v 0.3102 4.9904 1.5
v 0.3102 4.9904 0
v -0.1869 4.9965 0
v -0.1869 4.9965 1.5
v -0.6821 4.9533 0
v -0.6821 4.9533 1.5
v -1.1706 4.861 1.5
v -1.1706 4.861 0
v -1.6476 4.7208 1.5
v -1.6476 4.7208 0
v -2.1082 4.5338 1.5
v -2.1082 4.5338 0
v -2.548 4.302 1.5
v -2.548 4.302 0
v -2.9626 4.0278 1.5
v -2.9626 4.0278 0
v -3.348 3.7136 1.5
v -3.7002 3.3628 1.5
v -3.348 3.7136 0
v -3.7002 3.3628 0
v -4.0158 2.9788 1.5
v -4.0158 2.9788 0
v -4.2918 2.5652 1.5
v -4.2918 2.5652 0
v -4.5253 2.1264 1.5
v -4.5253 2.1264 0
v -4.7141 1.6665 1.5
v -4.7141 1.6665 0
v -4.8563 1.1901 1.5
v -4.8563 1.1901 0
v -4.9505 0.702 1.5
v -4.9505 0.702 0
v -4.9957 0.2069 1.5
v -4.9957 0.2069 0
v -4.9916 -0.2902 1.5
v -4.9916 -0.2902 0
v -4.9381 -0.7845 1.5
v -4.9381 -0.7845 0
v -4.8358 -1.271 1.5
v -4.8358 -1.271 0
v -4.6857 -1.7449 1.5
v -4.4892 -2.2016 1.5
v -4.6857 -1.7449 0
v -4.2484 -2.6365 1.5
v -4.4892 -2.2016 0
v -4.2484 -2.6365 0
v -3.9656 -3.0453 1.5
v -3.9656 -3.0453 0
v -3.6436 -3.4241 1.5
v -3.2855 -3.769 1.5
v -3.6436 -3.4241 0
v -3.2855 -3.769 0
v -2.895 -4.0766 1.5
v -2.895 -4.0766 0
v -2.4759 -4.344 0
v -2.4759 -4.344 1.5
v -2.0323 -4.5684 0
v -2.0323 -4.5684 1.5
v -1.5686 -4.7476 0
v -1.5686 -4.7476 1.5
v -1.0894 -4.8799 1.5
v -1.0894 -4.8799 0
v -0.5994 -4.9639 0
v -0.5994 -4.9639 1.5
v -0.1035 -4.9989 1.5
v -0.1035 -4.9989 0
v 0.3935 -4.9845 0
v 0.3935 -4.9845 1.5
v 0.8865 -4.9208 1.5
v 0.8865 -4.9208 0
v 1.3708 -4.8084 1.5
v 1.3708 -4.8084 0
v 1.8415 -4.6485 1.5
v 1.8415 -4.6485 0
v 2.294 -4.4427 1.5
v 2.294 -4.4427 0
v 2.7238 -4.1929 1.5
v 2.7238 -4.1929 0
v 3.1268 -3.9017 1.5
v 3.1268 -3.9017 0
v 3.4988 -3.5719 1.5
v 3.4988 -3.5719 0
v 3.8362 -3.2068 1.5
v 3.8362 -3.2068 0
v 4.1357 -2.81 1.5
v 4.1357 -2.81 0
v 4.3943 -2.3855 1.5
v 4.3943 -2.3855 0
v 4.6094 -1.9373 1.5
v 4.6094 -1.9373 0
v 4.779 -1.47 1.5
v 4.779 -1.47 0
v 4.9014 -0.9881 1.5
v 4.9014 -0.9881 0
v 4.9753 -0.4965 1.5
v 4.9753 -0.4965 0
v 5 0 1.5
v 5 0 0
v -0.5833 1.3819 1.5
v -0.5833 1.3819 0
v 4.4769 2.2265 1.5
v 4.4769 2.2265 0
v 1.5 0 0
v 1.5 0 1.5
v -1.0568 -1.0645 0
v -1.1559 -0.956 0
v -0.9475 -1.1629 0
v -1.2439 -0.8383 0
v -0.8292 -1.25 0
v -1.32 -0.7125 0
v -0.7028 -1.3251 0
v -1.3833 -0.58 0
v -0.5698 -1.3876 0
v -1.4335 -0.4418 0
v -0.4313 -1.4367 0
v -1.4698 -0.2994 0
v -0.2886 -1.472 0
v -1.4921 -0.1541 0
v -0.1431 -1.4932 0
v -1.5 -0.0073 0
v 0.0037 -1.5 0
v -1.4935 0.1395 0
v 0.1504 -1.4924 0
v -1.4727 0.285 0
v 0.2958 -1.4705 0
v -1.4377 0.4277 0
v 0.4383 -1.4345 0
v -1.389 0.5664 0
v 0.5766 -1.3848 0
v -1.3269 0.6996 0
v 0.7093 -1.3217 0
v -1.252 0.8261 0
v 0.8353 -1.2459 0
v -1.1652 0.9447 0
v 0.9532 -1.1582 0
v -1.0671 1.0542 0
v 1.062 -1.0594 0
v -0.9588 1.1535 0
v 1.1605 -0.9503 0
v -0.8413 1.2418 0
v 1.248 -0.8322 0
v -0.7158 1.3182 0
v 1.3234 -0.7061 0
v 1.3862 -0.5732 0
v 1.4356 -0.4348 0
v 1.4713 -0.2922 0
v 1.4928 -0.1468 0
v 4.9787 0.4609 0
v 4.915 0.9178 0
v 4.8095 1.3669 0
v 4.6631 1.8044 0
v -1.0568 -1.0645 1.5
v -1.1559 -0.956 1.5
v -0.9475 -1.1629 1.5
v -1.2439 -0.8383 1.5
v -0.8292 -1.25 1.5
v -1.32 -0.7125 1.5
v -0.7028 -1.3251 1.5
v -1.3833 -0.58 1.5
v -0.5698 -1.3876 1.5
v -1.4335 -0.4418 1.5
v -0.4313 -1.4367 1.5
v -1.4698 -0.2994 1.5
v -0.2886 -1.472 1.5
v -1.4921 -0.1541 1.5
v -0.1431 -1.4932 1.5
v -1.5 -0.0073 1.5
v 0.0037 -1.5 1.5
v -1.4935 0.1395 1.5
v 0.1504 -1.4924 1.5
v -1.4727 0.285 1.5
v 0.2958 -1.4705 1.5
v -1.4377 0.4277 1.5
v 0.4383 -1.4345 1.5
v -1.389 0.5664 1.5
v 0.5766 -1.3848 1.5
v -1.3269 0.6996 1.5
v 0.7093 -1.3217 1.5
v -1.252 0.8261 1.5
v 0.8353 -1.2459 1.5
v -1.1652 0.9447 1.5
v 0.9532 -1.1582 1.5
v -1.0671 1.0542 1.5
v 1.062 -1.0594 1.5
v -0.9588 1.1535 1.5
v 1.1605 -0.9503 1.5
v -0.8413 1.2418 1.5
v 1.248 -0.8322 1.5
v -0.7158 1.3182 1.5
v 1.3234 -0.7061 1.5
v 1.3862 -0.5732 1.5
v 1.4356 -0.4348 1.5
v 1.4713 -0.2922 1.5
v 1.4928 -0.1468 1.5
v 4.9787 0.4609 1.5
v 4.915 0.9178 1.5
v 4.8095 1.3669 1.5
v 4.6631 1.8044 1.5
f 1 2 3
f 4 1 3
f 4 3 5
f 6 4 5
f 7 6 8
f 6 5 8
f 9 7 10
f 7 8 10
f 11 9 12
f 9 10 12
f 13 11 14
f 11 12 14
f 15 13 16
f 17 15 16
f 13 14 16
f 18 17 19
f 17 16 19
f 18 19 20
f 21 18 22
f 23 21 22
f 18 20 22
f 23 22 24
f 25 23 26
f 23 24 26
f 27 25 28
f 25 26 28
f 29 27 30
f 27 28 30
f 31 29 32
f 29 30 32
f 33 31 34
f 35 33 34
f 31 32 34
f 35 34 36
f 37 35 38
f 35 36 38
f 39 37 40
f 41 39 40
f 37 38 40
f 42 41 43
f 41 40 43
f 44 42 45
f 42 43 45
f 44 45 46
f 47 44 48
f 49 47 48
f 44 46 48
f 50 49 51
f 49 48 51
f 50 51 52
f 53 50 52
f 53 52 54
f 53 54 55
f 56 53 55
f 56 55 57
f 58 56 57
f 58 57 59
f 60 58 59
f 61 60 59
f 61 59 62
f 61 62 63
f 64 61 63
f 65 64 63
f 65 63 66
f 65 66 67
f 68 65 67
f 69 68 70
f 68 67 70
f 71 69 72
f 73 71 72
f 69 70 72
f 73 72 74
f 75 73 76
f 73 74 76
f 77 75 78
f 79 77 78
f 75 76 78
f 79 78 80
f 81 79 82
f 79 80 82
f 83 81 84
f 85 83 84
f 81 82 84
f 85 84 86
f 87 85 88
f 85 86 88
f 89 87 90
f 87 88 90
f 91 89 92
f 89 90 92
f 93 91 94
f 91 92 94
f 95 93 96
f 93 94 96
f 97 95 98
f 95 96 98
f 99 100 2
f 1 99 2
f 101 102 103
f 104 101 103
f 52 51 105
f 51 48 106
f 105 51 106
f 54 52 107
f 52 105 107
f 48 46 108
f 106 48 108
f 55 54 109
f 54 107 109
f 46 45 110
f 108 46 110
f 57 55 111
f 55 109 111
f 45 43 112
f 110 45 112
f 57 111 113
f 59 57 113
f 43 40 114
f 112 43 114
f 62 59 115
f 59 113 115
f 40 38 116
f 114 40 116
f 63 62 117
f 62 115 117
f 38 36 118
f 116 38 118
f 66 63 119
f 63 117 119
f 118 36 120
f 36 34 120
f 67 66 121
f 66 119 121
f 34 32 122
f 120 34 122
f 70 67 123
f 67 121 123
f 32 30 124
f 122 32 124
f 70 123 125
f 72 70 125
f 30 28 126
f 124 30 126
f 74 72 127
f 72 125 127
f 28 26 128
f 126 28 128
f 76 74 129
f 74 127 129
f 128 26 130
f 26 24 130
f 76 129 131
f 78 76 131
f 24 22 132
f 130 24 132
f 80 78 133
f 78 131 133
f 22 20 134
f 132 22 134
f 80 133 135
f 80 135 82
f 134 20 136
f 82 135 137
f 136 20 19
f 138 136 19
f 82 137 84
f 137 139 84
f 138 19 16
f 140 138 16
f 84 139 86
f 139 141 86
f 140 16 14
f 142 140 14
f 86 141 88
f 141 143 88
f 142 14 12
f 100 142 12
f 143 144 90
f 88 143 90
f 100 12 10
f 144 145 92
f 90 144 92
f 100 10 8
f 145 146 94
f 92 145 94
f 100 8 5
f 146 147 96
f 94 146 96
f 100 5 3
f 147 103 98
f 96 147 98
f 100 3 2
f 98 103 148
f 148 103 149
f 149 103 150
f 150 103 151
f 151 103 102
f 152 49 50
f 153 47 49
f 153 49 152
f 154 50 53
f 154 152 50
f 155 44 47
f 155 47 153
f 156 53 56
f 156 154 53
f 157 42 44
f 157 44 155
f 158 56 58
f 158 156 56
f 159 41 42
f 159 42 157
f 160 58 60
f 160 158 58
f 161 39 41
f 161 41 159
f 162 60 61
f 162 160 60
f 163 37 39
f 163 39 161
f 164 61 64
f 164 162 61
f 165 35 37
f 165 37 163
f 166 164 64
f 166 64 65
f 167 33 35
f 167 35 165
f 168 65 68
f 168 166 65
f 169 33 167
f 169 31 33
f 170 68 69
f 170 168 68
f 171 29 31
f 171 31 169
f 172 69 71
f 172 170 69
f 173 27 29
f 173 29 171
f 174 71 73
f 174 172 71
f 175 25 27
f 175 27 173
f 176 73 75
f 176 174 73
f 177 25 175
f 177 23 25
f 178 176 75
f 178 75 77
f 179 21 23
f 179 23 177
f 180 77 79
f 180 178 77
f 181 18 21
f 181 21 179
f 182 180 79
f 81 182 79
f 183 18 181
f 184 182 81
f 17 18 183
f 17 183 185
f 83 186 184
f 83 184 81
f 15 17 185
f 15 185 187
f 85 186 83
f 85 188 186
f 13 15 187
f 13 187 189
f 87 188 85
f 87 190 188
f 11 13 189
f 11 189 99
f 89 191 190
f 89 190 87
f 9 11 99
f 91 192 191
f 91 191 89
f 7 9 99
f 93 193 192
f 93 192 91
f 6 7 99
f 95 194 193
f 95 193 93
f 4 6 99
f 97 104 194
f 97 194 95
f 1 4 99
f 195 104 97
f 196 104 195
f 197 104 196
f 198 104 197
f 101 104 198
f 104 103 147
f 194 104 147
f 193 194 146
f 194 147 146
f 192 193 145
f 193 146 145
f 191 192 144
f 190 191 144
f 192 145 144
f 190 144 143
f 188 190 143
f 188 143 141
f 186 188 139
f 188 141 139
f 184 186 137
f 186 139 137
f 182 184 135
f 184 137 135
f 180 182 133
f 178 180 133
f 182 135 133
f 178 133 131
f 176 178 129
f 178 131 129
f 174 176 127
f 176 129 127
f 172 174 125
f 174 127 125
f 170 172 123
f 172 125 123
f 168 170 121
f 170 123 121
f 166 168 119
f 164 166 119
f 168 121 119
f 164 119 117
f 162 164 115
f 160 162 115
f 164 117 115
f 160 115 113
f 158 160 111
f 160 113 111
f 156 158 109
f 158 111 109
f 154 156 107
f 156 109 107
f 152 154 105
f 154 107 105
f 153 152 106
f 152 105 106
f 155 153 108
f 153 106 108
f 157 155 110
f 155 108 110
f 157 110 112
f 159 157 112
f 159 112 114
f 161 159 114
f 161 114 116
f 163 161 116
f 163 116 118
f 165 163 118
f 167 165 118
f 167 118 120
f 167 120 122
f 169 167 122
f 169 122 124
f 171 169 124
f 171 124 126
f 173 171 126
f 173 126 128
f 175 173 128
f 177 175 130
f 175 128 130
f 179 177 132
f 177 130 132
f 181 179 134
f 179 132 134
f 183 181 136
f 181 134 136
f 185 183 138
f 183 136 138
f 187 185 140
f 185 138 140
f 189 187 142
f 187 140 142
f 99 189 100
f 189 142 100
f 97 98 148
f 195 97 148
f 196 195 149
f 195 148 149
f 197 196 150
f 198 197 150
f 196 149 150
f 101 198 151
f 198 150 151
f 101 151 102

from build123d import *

# Parameters (mm, degrees)
F3_DEPTH = 1.5
F4_R     = 4
F5_DEPTH = 0.5


with BuildPart() as f3:
    # F2 (on Top) → F3 (new body)
    with BuildSketch(Plane.XY):
        with BuildLine():
            ThreePointArc((0.3102344361, 4.9903661784), (-3.6435677694, -3.4240931515), (5, 0))
            ThreePointArc((5, 0), (4.8674688244, 1.1435677694), (4.4769011027, 2.2265121865))
            Line((4.4769011027, 2.2265121865), (1.5, 0))
            ThreePointArc((1.5, 0), (-0.8291561976, -1.25), (-0.5833333333, 1.381926996))
            Line((-0.5833333333, 1.381926996), (0.3102344361, 4.9903661784))
        make_face()
    extrude(amount=F3_DEPTH)

    # F4 (on face) → F5 (cut)
    with BuildSketch(Plane.XY.offset(1.5)):
        Circle(F4_R)
    extrude(amount=F5_DEPTH, mode=Mode.SUBTRACT)


solid = f3.part
